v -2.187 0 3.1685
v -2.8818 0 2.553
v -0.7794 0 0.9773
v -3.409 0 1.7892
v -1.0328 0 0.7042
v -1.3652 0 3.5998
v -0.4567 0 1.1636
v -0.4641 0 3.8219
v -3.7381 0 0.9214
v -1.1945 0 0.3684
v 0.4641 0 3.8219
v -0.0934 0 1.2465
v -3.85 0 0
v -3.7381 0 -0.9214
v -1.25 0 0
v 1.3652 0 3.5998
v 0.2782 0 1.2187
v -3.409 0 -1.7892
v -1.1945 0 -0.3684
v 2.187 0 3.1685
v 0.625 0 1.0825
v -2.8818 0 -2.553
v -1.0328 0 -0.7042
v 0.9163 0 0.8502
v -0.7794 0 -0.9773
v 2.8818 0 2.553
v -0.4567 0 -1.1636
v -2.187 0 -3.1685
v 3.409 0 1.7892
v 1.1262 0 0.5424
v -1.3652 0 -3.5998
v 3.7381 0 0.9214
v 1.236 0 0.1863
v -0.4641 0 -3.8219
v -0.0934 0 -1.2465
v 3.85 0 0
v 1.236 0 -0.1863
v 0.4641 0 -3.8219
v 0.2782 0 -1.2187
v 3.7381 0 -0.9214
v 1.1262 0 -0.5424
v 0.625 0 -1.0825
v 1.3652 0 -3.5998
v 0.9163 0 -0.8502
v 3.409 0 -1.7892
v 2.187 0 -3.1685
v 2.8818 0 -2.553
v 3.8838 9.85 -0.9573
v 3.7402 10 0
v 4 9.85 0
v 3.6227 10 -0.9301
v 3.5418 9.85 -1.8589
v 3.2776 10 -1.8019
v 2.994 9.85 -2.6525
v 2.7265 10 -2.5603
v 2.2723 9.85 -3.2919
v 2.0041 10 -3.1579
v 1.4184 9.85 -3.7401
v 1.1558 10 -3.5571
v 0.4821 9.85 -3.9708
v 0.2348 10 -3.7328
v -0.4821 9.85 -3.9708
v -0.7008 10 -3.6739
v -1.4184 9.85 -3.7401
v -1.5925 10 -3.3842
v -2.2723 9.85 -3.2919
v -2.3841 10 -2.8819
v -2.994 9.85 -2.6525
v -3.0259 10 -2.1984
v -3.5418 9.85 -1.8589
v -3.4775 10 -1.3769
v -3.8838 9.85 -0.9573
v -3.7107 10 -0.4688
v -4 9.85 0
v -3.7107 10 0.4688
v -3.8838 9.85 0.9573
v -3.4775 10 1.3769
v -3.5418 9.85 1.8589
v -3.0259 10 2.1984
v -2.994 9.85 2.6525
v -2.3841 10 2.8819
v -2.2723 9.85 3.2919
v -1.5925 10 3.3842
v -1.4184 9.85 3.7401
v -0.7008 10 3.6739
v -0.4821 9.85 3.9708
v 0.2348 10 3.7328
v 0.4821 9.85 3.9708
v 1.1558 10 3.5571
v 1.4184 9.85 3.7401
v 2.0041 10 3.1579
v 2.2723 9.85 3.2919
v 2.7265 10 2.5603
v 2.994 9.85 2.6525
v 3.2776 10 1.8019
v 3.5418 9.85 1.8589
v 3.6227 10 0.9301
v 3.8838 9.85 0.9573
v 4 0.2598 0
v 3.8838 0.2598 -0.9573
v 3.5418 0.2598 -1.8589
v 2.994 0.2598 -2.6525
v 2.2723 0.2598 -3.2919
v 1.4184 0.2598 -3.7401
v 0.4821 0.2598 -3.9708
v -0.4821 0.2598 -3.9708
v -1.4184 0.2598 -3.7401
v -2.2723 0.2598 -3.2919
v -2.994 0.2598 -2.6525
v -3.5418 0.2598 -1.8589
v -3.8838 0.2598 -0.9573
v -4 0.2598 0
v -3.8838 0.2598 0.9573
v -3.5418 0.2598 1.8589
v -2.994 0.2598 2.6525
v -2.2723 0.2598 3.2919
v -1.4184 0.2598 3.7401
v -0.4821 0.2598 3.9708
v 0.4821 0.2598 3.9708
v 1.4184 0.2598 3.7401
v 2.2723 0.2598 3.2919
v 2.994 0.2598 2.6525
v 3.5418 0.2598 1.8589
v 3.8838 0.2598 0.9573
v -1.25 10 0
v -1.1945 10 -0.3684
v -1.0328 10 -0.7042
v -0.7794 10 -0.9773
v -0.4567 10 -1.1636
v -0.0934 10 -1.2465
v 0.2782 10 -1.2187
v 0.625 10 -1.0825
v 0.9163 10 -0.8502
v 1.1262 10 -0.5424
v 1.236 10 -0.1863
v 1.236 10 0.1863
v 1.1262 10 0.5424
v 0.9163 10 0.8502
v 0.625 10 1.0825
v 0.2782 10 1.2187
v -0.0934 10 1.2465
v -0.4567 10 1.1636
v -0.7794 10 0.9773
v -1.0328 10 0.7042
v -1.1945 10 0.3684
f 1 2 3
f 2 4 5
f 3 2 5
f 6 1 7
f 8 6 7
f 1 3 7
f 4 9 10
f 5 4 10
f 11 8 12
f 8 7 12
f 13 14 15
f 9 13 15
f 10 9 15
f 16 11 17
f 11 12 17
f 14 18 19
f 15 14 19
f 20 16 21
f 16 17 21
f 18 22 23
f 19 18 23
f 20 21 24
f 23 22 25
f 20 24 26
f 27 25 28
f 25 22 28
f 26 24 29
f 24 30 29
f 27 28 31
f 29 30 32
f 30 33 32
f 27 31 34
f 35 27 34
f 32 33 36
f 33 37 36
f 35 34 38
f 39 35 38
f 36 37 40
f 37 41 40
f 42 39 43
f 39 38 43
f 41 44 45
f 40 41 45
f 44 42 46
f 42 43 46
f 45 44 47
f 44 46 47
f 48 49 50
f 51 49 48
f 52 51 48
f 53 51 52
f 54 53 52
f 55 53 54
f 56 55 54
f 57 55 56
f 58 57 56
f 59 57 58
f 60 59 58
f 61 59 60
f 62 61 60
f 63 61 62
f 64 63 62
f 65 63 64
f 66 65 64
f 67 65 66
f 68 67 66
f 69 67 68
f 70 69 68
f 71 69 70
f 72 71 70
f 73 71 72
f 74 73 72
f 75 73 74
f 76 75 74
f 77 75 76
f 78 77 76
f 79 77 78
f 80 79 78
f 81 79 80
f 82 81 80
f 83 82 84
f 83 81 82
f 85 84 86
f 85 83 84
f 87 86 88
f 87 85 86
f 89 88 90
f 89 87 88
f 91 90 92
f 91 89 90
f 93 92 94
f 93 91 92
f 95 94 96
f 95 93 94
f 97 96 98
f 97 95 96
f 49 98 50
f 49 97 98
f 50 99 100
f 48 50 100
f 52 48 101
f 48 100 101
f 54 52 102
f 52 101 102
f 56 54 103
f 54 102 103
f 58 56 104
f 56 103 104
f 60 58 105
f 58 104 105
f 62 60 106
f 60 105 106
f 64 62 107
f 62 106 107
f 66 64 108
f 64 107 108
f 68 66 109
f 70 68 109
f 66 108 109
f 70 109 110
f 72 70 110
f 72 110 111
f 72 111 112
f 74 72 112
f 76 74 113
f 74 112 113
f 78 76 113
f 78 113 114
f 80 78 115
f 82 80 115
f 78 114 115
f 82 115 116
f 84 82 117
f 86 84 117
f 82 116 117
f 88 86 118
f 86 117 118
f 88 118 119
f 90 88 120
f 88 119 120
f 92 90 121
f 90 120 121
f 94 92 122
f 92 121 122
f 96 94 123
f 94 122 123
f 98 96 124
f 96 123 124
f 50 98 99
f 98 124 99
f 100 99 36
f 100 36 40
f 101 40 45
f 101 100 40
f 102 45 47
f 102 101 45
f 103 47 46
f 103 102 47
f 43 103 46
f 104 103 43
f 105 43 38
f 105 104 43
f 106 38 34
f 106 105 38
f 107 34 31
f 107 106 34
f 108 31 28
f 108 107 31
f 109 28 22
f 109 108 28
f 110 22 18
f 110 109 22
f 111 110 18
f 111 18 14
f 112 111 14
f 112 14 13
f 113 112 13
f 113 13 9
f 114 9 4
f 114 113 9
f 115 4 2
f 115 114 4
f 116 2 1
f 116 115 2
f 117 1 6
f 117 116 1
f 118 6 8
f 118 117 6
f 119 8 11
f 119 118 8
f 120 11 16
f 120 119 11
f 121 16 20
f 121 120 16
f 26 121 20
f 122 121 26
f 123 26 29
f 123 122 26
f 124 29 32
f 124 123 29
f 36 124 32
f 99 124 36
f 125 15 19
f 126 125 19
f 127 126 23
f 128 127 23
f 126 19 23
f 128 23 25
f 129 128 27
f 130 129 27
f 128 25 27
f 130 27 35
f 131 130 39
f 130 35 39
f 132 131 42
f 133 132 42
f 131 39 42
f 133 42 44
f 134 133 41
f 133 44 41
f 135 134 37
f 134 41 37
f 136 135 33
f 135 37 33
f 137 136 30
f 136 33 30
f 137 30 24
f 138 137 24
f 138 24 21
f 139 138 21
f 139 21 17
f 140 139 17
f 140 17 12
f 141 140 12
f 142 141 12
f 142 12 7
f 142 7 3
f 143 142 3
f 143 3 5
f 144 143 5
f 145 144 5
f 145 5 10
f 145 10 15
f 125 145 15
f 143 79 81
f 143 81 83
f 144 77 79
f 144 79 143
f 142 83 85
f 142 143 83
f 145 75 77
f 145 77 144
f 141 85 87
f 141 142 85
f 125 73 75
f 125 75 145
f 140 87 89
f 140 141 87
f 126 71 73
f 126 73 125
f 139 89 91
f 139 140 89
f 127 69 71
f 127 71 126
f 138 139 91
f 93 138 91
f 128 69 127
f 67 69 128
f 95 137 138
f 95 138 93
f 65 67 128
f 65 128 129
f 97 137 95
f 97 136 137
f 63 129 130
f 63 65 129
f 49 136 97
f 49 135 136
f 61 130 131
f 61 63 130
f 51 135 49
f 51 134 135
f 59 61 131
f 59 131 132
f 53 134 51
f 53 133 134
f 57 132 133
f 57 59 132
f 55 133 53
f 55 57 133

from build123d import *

# Parameters (mm, degrees)
SKETCH1_R             = 4
BOSS_EXTRUDE1_DEPTH   = 10
CHAMFER1_SIZE         = 0.15
CHAMFER1_SIZE2        = 0.259807621
CHAMFER1_PART_2_SIZE  = 0.15
CHAMFER1_PART_2_SIZE2 = 0.259807621
M3X0_5_TAPPED_HOLE1_D = 2.5


with BuildPart() as part:
    # Sketch1 → Boss-Extrude1 (new body)
    with BuildSketch(Plane(origin=(0, 0, 0), x_dir=(1, 0, 0), z_dir=(0, 1, 0))):
        Circle(SKETCH1_R)
    extrude(amount=BOSS_EXTRUDE1_DEPTH)

    # Chamfer1
    chamfer1_edges = [part.edges().sort_by_distance(p)[0] for p in [
        (-4, 0, 0),
    ]]
    chamfer1_side = [part.faces().sort_by_distance(p)[0] for p in [
        (0, 0, 0),
    ]]
    chamfer(chamfer1_edges, length=CHAMFER1_SIZE, length2=CHAMFER1_SIZE2, reference=chamfer1_side[0])

    # Chamfer1 part 2
    chamfer1_part_2_edges = [part.edges().sort_by_distance(p)[0] for p in [
        (-4, 10, 0),
    ]]
    chamfer1_part_2_side = [part.faces().sort_by_distance(p)[0] for p in [
        (-4, 5, 0),
    ]]
    chamfer(chamfer1_part_2_edges, length=CHAMFER1_PART_2_SIZE, length2=CHAMFER1_PART_2_SIZE2, reference=chamfer1_part_2_side[0])

    # M3x0.5 Tapped Hole1 (through all)
    with Locations(Plane(origin=(0, 10, 0), x_dir=(1, 0, 0), z_dir=(0, 1, 0))):
        with Locations((0, 0)):
            Hole(M3X0_5_TAPPED_HOLE1_D / 2)


solid = part.part
